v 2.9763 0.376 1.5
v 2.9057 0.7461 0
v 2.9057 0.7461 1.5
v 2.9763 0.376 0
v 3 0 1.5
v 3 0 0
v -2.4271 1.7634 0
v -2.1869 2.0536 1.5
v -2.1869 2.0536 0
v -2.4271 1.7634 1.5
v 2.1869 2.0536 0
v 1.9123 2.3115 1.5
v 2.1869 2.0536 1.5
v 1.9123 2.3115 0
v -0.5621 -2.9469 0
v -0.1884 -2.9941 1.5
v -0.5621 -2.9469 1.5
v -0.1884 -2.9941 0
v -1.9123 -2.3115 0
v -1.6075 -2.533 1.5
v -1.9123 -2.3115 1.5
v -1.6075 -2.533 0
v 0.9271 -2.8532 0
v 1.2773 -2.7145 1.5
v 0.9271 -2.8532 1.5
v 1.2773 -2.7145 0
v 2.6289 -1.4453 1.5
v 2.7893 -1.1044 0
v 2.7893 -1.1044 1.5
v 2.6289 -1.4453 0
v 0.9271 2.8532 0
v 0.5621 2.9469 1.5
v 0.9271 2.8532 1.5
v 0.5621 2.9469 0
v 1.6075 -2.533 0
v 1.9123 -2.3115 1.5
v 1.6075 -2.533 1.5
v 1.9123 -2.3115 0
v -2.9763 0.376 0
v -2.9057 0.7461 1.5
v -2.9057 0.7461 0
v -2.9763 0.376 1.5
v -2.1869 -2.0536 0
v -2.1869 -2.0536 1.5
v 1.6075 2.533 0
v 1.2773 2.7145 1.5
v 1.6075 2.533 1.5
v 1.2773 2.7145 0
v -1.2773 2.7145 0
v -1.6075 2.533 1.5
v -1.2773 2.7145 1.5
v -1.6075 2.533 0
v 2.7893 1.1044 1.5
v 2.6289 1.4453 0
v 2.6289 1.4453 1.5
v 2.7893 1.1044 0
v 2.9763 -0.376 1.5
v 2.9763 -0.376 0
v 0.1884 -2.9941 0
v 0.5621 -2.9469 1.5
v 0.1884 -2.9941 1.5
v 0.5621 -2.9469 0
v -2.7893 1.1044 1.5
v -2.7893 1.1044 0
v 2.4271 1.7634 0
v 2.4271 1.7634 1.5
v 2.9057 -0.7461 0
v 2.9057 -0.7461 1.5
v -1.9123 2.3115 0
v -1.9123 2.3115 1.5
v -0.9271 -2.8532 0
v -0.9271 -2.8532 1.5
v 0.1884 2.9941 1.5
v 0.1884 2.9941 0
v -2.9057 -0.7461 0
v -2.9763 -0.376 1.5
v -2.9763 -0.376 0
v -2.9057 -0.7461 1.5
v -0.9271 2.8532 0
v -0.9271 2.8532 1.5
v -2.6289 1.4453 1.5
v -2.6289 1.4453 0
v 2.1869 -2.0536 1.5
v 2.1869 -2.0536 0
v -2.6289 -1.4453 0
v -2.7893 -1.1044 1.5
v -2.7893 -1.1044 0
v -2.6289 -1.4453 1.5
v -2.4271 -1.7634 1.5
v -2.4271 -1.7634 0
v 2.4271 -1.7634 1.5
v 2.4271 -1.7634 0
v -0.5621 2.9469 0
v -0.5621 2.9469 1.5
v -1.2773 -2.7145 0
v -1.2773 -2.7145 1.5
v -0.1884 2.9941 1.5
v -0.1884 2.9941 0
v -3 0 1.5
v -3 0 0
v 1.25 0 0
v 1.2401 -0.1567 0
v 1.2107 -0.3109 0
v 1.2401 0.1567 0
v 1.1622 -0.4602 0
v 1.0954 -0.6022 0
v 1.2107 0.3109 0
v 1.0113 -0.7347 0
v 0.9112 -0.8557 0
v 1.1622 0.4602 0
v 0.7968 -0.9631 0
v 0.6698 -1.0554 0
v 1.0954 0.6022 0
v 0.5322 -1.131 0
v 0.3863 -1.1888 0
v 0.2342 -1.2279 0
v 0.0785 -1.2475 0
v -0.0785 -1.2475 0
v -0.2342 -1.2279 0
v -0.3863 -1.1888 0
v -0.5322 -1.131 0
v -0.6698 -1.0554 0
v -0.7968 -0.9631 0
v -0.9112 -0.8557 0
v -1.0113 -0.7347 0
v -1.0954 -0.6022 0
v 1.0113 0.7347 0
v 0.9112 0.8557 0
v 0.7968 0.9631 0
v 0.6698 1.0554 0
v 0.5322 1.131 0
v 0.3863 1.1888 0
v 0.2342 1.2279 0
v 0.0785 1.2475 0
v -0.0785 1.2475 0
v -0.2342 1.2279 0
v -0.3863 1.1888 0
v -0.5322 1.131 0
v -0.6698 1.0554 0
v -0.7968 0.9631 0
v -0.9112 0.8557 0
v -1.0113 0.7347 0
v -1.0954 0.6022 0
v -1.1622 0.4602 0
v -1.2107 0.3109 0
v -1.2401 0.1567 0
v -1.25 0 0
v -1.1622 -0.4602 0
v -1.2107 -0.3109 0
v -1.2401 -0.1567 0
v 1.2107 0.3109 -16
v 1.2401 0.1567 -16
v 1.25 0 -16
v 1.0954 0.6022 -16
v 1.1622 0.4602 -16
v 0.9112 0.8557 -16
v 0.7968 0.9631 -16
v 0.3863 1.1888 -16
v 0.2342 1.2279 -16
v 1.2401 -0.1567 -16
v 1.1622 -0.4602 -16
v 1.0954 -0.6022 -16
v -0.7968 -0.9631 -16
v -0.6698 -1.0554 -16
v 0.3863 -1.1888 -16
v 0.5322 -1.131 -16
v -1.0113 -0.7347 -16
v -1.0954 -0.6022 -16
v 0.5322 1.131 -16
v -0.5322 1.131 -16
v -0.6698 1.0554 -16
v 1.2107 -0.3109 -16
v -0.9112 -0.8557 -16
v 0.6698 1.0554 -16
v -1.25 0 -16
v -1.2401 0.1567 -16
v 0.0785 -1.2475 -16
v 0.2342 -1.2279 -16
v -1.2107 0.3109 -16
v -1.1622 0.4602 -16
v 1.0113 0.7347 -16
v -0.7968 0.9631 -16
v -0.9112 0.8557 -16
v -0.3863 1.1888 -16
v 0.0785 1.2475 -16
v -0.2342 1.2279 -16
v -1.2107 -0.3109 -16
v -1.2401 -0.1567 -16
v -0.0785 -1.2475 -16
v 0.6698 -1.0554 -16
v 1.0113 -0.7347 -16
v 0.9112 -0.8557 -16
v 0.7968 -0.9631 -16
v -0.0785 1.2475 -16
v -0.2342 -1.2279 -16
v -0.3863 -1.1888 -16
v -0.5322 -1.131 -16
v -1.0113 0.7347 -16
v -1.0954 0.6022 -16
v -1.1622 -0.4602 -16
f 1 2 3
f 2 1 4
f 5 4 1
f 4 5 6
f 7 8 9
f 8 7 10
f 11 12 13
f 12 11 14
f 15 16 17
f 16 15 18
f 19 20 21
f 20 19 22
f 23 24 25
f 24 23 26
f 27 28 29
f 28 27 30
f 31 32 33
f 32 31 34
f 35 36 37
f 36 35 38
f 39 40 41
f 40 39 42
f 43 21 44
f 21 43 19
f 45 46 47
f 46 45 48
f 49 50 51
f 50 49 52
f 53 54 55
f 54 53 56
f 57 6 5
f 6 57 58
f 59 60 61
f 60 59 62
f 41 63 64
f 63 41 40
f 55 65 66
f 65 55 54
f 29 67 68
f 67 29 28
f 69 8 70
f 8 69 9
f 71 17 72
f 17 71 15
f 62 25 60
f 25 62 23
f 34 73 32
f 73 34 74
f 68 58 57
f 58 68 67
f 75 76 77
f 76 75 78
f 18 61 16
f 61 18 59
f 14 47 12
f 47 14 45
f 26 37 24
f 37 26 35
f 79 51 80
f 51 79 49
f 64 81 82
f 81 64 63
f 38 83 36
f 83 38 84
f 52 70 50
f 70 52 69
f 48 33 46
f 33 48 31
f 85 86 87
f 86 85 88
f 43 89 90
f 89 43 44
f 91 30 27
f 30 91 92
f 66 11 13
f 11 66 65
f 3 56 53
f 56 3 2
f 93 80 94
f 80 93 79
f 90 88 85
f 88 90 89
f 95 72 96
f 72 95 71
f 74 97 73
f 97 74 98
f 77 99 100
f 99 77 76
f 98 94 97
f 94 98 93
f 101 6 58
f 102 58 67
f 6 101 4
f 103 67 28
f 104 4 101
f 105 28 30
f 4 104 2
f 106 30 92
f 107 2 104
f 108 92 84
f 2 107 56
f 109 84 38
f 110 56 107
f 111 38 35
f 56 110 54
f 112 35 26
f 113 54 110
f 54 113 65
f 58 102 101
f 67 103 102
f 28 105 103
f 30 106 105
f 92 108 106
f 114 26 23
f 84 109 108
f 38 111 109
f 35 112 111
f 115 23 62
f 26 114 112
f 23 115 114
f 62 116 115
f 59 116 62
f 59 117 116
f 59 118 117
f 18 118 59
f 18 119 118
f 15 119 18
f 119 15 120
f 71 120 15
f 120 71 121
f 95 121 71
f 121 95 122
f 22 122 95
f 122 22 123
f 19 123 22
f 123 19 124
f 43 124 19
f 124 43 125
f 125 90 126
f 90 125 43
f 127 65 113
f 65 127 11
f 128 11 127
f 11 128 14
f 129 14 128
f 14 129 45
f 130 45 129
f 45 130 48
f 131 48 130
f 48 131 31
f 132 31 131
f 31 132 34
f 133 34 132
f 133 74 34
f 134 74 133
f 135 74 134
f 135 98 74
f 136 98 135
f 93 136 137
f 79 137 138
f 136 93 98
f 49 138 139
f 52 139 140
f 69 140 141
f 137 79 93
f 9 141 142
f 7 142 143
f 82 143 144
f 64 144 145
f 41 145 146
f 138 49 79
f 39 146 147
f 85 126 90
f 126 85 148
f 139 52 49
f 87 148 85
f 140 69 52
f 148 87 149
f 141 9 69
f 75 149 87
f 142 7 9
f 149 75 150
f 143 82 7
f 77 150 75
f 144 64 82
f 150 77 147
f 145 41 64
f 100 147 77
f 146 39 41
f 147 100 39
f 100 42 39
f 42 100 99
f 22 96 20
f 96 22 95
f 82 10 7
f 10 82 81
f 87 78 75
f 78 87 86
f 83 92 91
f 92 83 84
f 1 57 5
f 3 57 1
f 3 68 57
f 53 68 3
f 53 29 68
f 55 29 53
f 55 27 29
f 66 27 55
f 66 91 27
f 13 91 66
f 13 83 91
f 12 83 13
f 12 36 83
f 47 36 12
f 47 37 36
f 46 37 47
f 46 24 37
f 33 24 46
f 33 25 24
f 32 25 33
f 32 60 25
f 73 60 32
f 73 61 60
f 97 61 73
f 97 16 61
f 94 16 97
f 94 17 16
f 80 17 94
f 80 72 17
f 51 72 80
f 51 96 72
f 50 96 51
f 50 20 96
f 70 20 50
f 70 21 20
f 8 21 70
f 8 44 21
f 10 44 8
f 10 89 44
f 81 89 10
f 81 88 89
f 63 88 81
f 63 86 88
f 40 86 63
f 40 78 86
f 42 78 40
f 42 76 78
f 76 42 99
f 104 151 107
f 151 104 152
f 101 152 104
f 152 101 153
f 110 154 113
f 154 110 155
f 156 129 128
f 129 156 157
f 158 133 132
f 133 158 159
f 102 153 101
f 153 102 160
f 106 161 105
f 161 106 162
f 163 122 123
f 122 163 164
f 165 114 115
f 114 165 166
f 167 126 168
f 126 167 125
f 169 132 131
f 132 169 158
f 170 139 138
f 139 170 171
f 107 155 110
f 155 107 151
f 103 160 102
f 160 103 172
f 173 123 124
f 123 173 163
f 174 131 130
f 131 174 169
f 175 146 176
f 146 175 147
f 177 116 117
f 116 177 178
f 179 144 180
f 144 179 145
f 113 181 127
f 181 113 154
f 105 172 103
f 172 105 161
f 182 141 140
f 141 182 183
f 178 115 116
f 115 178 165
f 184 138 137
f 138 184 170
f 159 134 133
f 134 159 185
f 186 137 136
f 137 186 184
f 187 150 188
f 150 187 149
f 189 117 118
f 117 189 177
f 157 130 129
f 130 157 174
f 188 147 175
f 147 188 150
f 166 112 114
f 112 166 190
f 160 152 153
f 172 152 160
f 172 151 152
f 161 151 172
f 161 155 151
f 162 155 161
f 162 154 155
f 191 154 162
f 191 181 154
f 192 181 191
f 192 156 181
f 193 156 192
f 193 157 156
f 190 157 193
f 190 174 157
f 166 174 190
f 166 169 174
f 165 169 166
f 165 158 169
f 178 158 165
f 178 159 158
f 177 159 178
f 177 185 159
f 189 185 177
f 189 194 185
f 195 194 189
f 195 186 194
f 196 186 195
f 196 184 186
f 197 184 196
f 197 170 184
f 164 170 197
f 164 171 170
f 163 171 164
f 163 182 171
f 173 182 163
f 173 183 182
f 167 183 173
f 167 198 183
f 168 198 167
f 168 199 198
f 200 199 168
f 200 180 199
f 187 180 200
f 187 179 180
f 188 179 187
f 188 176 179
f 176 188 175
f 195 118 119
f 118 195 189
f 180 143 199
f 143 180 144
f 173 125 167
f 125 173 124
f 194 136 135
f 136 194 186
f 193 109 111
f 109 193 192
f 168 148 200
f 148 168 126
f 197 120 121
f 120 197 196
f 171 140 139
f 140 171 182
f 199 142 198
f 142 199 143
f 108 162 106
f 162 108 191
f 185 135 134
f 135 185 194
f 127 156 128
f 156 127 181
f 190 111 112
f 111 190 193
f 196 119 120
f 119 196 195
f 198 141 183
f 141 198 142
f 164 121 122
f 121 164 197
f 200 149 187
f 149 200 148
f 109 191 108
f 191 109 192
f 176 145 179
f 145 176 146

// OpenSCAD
$fn = 50;

difference() {
	union() {
		translate(v = [0, 0, 0]) {
			rotate(a = [0, 0, 0]) {
				difference() {
					union() {
						cylinder(h = 1.5, r = 3.0);
						translate(v = [0, 0, -16.0]) {
							cylinder(h = 16, r = 1.25);
						}
					}
					union();
				}
			}
		}
	}
	union();
}
